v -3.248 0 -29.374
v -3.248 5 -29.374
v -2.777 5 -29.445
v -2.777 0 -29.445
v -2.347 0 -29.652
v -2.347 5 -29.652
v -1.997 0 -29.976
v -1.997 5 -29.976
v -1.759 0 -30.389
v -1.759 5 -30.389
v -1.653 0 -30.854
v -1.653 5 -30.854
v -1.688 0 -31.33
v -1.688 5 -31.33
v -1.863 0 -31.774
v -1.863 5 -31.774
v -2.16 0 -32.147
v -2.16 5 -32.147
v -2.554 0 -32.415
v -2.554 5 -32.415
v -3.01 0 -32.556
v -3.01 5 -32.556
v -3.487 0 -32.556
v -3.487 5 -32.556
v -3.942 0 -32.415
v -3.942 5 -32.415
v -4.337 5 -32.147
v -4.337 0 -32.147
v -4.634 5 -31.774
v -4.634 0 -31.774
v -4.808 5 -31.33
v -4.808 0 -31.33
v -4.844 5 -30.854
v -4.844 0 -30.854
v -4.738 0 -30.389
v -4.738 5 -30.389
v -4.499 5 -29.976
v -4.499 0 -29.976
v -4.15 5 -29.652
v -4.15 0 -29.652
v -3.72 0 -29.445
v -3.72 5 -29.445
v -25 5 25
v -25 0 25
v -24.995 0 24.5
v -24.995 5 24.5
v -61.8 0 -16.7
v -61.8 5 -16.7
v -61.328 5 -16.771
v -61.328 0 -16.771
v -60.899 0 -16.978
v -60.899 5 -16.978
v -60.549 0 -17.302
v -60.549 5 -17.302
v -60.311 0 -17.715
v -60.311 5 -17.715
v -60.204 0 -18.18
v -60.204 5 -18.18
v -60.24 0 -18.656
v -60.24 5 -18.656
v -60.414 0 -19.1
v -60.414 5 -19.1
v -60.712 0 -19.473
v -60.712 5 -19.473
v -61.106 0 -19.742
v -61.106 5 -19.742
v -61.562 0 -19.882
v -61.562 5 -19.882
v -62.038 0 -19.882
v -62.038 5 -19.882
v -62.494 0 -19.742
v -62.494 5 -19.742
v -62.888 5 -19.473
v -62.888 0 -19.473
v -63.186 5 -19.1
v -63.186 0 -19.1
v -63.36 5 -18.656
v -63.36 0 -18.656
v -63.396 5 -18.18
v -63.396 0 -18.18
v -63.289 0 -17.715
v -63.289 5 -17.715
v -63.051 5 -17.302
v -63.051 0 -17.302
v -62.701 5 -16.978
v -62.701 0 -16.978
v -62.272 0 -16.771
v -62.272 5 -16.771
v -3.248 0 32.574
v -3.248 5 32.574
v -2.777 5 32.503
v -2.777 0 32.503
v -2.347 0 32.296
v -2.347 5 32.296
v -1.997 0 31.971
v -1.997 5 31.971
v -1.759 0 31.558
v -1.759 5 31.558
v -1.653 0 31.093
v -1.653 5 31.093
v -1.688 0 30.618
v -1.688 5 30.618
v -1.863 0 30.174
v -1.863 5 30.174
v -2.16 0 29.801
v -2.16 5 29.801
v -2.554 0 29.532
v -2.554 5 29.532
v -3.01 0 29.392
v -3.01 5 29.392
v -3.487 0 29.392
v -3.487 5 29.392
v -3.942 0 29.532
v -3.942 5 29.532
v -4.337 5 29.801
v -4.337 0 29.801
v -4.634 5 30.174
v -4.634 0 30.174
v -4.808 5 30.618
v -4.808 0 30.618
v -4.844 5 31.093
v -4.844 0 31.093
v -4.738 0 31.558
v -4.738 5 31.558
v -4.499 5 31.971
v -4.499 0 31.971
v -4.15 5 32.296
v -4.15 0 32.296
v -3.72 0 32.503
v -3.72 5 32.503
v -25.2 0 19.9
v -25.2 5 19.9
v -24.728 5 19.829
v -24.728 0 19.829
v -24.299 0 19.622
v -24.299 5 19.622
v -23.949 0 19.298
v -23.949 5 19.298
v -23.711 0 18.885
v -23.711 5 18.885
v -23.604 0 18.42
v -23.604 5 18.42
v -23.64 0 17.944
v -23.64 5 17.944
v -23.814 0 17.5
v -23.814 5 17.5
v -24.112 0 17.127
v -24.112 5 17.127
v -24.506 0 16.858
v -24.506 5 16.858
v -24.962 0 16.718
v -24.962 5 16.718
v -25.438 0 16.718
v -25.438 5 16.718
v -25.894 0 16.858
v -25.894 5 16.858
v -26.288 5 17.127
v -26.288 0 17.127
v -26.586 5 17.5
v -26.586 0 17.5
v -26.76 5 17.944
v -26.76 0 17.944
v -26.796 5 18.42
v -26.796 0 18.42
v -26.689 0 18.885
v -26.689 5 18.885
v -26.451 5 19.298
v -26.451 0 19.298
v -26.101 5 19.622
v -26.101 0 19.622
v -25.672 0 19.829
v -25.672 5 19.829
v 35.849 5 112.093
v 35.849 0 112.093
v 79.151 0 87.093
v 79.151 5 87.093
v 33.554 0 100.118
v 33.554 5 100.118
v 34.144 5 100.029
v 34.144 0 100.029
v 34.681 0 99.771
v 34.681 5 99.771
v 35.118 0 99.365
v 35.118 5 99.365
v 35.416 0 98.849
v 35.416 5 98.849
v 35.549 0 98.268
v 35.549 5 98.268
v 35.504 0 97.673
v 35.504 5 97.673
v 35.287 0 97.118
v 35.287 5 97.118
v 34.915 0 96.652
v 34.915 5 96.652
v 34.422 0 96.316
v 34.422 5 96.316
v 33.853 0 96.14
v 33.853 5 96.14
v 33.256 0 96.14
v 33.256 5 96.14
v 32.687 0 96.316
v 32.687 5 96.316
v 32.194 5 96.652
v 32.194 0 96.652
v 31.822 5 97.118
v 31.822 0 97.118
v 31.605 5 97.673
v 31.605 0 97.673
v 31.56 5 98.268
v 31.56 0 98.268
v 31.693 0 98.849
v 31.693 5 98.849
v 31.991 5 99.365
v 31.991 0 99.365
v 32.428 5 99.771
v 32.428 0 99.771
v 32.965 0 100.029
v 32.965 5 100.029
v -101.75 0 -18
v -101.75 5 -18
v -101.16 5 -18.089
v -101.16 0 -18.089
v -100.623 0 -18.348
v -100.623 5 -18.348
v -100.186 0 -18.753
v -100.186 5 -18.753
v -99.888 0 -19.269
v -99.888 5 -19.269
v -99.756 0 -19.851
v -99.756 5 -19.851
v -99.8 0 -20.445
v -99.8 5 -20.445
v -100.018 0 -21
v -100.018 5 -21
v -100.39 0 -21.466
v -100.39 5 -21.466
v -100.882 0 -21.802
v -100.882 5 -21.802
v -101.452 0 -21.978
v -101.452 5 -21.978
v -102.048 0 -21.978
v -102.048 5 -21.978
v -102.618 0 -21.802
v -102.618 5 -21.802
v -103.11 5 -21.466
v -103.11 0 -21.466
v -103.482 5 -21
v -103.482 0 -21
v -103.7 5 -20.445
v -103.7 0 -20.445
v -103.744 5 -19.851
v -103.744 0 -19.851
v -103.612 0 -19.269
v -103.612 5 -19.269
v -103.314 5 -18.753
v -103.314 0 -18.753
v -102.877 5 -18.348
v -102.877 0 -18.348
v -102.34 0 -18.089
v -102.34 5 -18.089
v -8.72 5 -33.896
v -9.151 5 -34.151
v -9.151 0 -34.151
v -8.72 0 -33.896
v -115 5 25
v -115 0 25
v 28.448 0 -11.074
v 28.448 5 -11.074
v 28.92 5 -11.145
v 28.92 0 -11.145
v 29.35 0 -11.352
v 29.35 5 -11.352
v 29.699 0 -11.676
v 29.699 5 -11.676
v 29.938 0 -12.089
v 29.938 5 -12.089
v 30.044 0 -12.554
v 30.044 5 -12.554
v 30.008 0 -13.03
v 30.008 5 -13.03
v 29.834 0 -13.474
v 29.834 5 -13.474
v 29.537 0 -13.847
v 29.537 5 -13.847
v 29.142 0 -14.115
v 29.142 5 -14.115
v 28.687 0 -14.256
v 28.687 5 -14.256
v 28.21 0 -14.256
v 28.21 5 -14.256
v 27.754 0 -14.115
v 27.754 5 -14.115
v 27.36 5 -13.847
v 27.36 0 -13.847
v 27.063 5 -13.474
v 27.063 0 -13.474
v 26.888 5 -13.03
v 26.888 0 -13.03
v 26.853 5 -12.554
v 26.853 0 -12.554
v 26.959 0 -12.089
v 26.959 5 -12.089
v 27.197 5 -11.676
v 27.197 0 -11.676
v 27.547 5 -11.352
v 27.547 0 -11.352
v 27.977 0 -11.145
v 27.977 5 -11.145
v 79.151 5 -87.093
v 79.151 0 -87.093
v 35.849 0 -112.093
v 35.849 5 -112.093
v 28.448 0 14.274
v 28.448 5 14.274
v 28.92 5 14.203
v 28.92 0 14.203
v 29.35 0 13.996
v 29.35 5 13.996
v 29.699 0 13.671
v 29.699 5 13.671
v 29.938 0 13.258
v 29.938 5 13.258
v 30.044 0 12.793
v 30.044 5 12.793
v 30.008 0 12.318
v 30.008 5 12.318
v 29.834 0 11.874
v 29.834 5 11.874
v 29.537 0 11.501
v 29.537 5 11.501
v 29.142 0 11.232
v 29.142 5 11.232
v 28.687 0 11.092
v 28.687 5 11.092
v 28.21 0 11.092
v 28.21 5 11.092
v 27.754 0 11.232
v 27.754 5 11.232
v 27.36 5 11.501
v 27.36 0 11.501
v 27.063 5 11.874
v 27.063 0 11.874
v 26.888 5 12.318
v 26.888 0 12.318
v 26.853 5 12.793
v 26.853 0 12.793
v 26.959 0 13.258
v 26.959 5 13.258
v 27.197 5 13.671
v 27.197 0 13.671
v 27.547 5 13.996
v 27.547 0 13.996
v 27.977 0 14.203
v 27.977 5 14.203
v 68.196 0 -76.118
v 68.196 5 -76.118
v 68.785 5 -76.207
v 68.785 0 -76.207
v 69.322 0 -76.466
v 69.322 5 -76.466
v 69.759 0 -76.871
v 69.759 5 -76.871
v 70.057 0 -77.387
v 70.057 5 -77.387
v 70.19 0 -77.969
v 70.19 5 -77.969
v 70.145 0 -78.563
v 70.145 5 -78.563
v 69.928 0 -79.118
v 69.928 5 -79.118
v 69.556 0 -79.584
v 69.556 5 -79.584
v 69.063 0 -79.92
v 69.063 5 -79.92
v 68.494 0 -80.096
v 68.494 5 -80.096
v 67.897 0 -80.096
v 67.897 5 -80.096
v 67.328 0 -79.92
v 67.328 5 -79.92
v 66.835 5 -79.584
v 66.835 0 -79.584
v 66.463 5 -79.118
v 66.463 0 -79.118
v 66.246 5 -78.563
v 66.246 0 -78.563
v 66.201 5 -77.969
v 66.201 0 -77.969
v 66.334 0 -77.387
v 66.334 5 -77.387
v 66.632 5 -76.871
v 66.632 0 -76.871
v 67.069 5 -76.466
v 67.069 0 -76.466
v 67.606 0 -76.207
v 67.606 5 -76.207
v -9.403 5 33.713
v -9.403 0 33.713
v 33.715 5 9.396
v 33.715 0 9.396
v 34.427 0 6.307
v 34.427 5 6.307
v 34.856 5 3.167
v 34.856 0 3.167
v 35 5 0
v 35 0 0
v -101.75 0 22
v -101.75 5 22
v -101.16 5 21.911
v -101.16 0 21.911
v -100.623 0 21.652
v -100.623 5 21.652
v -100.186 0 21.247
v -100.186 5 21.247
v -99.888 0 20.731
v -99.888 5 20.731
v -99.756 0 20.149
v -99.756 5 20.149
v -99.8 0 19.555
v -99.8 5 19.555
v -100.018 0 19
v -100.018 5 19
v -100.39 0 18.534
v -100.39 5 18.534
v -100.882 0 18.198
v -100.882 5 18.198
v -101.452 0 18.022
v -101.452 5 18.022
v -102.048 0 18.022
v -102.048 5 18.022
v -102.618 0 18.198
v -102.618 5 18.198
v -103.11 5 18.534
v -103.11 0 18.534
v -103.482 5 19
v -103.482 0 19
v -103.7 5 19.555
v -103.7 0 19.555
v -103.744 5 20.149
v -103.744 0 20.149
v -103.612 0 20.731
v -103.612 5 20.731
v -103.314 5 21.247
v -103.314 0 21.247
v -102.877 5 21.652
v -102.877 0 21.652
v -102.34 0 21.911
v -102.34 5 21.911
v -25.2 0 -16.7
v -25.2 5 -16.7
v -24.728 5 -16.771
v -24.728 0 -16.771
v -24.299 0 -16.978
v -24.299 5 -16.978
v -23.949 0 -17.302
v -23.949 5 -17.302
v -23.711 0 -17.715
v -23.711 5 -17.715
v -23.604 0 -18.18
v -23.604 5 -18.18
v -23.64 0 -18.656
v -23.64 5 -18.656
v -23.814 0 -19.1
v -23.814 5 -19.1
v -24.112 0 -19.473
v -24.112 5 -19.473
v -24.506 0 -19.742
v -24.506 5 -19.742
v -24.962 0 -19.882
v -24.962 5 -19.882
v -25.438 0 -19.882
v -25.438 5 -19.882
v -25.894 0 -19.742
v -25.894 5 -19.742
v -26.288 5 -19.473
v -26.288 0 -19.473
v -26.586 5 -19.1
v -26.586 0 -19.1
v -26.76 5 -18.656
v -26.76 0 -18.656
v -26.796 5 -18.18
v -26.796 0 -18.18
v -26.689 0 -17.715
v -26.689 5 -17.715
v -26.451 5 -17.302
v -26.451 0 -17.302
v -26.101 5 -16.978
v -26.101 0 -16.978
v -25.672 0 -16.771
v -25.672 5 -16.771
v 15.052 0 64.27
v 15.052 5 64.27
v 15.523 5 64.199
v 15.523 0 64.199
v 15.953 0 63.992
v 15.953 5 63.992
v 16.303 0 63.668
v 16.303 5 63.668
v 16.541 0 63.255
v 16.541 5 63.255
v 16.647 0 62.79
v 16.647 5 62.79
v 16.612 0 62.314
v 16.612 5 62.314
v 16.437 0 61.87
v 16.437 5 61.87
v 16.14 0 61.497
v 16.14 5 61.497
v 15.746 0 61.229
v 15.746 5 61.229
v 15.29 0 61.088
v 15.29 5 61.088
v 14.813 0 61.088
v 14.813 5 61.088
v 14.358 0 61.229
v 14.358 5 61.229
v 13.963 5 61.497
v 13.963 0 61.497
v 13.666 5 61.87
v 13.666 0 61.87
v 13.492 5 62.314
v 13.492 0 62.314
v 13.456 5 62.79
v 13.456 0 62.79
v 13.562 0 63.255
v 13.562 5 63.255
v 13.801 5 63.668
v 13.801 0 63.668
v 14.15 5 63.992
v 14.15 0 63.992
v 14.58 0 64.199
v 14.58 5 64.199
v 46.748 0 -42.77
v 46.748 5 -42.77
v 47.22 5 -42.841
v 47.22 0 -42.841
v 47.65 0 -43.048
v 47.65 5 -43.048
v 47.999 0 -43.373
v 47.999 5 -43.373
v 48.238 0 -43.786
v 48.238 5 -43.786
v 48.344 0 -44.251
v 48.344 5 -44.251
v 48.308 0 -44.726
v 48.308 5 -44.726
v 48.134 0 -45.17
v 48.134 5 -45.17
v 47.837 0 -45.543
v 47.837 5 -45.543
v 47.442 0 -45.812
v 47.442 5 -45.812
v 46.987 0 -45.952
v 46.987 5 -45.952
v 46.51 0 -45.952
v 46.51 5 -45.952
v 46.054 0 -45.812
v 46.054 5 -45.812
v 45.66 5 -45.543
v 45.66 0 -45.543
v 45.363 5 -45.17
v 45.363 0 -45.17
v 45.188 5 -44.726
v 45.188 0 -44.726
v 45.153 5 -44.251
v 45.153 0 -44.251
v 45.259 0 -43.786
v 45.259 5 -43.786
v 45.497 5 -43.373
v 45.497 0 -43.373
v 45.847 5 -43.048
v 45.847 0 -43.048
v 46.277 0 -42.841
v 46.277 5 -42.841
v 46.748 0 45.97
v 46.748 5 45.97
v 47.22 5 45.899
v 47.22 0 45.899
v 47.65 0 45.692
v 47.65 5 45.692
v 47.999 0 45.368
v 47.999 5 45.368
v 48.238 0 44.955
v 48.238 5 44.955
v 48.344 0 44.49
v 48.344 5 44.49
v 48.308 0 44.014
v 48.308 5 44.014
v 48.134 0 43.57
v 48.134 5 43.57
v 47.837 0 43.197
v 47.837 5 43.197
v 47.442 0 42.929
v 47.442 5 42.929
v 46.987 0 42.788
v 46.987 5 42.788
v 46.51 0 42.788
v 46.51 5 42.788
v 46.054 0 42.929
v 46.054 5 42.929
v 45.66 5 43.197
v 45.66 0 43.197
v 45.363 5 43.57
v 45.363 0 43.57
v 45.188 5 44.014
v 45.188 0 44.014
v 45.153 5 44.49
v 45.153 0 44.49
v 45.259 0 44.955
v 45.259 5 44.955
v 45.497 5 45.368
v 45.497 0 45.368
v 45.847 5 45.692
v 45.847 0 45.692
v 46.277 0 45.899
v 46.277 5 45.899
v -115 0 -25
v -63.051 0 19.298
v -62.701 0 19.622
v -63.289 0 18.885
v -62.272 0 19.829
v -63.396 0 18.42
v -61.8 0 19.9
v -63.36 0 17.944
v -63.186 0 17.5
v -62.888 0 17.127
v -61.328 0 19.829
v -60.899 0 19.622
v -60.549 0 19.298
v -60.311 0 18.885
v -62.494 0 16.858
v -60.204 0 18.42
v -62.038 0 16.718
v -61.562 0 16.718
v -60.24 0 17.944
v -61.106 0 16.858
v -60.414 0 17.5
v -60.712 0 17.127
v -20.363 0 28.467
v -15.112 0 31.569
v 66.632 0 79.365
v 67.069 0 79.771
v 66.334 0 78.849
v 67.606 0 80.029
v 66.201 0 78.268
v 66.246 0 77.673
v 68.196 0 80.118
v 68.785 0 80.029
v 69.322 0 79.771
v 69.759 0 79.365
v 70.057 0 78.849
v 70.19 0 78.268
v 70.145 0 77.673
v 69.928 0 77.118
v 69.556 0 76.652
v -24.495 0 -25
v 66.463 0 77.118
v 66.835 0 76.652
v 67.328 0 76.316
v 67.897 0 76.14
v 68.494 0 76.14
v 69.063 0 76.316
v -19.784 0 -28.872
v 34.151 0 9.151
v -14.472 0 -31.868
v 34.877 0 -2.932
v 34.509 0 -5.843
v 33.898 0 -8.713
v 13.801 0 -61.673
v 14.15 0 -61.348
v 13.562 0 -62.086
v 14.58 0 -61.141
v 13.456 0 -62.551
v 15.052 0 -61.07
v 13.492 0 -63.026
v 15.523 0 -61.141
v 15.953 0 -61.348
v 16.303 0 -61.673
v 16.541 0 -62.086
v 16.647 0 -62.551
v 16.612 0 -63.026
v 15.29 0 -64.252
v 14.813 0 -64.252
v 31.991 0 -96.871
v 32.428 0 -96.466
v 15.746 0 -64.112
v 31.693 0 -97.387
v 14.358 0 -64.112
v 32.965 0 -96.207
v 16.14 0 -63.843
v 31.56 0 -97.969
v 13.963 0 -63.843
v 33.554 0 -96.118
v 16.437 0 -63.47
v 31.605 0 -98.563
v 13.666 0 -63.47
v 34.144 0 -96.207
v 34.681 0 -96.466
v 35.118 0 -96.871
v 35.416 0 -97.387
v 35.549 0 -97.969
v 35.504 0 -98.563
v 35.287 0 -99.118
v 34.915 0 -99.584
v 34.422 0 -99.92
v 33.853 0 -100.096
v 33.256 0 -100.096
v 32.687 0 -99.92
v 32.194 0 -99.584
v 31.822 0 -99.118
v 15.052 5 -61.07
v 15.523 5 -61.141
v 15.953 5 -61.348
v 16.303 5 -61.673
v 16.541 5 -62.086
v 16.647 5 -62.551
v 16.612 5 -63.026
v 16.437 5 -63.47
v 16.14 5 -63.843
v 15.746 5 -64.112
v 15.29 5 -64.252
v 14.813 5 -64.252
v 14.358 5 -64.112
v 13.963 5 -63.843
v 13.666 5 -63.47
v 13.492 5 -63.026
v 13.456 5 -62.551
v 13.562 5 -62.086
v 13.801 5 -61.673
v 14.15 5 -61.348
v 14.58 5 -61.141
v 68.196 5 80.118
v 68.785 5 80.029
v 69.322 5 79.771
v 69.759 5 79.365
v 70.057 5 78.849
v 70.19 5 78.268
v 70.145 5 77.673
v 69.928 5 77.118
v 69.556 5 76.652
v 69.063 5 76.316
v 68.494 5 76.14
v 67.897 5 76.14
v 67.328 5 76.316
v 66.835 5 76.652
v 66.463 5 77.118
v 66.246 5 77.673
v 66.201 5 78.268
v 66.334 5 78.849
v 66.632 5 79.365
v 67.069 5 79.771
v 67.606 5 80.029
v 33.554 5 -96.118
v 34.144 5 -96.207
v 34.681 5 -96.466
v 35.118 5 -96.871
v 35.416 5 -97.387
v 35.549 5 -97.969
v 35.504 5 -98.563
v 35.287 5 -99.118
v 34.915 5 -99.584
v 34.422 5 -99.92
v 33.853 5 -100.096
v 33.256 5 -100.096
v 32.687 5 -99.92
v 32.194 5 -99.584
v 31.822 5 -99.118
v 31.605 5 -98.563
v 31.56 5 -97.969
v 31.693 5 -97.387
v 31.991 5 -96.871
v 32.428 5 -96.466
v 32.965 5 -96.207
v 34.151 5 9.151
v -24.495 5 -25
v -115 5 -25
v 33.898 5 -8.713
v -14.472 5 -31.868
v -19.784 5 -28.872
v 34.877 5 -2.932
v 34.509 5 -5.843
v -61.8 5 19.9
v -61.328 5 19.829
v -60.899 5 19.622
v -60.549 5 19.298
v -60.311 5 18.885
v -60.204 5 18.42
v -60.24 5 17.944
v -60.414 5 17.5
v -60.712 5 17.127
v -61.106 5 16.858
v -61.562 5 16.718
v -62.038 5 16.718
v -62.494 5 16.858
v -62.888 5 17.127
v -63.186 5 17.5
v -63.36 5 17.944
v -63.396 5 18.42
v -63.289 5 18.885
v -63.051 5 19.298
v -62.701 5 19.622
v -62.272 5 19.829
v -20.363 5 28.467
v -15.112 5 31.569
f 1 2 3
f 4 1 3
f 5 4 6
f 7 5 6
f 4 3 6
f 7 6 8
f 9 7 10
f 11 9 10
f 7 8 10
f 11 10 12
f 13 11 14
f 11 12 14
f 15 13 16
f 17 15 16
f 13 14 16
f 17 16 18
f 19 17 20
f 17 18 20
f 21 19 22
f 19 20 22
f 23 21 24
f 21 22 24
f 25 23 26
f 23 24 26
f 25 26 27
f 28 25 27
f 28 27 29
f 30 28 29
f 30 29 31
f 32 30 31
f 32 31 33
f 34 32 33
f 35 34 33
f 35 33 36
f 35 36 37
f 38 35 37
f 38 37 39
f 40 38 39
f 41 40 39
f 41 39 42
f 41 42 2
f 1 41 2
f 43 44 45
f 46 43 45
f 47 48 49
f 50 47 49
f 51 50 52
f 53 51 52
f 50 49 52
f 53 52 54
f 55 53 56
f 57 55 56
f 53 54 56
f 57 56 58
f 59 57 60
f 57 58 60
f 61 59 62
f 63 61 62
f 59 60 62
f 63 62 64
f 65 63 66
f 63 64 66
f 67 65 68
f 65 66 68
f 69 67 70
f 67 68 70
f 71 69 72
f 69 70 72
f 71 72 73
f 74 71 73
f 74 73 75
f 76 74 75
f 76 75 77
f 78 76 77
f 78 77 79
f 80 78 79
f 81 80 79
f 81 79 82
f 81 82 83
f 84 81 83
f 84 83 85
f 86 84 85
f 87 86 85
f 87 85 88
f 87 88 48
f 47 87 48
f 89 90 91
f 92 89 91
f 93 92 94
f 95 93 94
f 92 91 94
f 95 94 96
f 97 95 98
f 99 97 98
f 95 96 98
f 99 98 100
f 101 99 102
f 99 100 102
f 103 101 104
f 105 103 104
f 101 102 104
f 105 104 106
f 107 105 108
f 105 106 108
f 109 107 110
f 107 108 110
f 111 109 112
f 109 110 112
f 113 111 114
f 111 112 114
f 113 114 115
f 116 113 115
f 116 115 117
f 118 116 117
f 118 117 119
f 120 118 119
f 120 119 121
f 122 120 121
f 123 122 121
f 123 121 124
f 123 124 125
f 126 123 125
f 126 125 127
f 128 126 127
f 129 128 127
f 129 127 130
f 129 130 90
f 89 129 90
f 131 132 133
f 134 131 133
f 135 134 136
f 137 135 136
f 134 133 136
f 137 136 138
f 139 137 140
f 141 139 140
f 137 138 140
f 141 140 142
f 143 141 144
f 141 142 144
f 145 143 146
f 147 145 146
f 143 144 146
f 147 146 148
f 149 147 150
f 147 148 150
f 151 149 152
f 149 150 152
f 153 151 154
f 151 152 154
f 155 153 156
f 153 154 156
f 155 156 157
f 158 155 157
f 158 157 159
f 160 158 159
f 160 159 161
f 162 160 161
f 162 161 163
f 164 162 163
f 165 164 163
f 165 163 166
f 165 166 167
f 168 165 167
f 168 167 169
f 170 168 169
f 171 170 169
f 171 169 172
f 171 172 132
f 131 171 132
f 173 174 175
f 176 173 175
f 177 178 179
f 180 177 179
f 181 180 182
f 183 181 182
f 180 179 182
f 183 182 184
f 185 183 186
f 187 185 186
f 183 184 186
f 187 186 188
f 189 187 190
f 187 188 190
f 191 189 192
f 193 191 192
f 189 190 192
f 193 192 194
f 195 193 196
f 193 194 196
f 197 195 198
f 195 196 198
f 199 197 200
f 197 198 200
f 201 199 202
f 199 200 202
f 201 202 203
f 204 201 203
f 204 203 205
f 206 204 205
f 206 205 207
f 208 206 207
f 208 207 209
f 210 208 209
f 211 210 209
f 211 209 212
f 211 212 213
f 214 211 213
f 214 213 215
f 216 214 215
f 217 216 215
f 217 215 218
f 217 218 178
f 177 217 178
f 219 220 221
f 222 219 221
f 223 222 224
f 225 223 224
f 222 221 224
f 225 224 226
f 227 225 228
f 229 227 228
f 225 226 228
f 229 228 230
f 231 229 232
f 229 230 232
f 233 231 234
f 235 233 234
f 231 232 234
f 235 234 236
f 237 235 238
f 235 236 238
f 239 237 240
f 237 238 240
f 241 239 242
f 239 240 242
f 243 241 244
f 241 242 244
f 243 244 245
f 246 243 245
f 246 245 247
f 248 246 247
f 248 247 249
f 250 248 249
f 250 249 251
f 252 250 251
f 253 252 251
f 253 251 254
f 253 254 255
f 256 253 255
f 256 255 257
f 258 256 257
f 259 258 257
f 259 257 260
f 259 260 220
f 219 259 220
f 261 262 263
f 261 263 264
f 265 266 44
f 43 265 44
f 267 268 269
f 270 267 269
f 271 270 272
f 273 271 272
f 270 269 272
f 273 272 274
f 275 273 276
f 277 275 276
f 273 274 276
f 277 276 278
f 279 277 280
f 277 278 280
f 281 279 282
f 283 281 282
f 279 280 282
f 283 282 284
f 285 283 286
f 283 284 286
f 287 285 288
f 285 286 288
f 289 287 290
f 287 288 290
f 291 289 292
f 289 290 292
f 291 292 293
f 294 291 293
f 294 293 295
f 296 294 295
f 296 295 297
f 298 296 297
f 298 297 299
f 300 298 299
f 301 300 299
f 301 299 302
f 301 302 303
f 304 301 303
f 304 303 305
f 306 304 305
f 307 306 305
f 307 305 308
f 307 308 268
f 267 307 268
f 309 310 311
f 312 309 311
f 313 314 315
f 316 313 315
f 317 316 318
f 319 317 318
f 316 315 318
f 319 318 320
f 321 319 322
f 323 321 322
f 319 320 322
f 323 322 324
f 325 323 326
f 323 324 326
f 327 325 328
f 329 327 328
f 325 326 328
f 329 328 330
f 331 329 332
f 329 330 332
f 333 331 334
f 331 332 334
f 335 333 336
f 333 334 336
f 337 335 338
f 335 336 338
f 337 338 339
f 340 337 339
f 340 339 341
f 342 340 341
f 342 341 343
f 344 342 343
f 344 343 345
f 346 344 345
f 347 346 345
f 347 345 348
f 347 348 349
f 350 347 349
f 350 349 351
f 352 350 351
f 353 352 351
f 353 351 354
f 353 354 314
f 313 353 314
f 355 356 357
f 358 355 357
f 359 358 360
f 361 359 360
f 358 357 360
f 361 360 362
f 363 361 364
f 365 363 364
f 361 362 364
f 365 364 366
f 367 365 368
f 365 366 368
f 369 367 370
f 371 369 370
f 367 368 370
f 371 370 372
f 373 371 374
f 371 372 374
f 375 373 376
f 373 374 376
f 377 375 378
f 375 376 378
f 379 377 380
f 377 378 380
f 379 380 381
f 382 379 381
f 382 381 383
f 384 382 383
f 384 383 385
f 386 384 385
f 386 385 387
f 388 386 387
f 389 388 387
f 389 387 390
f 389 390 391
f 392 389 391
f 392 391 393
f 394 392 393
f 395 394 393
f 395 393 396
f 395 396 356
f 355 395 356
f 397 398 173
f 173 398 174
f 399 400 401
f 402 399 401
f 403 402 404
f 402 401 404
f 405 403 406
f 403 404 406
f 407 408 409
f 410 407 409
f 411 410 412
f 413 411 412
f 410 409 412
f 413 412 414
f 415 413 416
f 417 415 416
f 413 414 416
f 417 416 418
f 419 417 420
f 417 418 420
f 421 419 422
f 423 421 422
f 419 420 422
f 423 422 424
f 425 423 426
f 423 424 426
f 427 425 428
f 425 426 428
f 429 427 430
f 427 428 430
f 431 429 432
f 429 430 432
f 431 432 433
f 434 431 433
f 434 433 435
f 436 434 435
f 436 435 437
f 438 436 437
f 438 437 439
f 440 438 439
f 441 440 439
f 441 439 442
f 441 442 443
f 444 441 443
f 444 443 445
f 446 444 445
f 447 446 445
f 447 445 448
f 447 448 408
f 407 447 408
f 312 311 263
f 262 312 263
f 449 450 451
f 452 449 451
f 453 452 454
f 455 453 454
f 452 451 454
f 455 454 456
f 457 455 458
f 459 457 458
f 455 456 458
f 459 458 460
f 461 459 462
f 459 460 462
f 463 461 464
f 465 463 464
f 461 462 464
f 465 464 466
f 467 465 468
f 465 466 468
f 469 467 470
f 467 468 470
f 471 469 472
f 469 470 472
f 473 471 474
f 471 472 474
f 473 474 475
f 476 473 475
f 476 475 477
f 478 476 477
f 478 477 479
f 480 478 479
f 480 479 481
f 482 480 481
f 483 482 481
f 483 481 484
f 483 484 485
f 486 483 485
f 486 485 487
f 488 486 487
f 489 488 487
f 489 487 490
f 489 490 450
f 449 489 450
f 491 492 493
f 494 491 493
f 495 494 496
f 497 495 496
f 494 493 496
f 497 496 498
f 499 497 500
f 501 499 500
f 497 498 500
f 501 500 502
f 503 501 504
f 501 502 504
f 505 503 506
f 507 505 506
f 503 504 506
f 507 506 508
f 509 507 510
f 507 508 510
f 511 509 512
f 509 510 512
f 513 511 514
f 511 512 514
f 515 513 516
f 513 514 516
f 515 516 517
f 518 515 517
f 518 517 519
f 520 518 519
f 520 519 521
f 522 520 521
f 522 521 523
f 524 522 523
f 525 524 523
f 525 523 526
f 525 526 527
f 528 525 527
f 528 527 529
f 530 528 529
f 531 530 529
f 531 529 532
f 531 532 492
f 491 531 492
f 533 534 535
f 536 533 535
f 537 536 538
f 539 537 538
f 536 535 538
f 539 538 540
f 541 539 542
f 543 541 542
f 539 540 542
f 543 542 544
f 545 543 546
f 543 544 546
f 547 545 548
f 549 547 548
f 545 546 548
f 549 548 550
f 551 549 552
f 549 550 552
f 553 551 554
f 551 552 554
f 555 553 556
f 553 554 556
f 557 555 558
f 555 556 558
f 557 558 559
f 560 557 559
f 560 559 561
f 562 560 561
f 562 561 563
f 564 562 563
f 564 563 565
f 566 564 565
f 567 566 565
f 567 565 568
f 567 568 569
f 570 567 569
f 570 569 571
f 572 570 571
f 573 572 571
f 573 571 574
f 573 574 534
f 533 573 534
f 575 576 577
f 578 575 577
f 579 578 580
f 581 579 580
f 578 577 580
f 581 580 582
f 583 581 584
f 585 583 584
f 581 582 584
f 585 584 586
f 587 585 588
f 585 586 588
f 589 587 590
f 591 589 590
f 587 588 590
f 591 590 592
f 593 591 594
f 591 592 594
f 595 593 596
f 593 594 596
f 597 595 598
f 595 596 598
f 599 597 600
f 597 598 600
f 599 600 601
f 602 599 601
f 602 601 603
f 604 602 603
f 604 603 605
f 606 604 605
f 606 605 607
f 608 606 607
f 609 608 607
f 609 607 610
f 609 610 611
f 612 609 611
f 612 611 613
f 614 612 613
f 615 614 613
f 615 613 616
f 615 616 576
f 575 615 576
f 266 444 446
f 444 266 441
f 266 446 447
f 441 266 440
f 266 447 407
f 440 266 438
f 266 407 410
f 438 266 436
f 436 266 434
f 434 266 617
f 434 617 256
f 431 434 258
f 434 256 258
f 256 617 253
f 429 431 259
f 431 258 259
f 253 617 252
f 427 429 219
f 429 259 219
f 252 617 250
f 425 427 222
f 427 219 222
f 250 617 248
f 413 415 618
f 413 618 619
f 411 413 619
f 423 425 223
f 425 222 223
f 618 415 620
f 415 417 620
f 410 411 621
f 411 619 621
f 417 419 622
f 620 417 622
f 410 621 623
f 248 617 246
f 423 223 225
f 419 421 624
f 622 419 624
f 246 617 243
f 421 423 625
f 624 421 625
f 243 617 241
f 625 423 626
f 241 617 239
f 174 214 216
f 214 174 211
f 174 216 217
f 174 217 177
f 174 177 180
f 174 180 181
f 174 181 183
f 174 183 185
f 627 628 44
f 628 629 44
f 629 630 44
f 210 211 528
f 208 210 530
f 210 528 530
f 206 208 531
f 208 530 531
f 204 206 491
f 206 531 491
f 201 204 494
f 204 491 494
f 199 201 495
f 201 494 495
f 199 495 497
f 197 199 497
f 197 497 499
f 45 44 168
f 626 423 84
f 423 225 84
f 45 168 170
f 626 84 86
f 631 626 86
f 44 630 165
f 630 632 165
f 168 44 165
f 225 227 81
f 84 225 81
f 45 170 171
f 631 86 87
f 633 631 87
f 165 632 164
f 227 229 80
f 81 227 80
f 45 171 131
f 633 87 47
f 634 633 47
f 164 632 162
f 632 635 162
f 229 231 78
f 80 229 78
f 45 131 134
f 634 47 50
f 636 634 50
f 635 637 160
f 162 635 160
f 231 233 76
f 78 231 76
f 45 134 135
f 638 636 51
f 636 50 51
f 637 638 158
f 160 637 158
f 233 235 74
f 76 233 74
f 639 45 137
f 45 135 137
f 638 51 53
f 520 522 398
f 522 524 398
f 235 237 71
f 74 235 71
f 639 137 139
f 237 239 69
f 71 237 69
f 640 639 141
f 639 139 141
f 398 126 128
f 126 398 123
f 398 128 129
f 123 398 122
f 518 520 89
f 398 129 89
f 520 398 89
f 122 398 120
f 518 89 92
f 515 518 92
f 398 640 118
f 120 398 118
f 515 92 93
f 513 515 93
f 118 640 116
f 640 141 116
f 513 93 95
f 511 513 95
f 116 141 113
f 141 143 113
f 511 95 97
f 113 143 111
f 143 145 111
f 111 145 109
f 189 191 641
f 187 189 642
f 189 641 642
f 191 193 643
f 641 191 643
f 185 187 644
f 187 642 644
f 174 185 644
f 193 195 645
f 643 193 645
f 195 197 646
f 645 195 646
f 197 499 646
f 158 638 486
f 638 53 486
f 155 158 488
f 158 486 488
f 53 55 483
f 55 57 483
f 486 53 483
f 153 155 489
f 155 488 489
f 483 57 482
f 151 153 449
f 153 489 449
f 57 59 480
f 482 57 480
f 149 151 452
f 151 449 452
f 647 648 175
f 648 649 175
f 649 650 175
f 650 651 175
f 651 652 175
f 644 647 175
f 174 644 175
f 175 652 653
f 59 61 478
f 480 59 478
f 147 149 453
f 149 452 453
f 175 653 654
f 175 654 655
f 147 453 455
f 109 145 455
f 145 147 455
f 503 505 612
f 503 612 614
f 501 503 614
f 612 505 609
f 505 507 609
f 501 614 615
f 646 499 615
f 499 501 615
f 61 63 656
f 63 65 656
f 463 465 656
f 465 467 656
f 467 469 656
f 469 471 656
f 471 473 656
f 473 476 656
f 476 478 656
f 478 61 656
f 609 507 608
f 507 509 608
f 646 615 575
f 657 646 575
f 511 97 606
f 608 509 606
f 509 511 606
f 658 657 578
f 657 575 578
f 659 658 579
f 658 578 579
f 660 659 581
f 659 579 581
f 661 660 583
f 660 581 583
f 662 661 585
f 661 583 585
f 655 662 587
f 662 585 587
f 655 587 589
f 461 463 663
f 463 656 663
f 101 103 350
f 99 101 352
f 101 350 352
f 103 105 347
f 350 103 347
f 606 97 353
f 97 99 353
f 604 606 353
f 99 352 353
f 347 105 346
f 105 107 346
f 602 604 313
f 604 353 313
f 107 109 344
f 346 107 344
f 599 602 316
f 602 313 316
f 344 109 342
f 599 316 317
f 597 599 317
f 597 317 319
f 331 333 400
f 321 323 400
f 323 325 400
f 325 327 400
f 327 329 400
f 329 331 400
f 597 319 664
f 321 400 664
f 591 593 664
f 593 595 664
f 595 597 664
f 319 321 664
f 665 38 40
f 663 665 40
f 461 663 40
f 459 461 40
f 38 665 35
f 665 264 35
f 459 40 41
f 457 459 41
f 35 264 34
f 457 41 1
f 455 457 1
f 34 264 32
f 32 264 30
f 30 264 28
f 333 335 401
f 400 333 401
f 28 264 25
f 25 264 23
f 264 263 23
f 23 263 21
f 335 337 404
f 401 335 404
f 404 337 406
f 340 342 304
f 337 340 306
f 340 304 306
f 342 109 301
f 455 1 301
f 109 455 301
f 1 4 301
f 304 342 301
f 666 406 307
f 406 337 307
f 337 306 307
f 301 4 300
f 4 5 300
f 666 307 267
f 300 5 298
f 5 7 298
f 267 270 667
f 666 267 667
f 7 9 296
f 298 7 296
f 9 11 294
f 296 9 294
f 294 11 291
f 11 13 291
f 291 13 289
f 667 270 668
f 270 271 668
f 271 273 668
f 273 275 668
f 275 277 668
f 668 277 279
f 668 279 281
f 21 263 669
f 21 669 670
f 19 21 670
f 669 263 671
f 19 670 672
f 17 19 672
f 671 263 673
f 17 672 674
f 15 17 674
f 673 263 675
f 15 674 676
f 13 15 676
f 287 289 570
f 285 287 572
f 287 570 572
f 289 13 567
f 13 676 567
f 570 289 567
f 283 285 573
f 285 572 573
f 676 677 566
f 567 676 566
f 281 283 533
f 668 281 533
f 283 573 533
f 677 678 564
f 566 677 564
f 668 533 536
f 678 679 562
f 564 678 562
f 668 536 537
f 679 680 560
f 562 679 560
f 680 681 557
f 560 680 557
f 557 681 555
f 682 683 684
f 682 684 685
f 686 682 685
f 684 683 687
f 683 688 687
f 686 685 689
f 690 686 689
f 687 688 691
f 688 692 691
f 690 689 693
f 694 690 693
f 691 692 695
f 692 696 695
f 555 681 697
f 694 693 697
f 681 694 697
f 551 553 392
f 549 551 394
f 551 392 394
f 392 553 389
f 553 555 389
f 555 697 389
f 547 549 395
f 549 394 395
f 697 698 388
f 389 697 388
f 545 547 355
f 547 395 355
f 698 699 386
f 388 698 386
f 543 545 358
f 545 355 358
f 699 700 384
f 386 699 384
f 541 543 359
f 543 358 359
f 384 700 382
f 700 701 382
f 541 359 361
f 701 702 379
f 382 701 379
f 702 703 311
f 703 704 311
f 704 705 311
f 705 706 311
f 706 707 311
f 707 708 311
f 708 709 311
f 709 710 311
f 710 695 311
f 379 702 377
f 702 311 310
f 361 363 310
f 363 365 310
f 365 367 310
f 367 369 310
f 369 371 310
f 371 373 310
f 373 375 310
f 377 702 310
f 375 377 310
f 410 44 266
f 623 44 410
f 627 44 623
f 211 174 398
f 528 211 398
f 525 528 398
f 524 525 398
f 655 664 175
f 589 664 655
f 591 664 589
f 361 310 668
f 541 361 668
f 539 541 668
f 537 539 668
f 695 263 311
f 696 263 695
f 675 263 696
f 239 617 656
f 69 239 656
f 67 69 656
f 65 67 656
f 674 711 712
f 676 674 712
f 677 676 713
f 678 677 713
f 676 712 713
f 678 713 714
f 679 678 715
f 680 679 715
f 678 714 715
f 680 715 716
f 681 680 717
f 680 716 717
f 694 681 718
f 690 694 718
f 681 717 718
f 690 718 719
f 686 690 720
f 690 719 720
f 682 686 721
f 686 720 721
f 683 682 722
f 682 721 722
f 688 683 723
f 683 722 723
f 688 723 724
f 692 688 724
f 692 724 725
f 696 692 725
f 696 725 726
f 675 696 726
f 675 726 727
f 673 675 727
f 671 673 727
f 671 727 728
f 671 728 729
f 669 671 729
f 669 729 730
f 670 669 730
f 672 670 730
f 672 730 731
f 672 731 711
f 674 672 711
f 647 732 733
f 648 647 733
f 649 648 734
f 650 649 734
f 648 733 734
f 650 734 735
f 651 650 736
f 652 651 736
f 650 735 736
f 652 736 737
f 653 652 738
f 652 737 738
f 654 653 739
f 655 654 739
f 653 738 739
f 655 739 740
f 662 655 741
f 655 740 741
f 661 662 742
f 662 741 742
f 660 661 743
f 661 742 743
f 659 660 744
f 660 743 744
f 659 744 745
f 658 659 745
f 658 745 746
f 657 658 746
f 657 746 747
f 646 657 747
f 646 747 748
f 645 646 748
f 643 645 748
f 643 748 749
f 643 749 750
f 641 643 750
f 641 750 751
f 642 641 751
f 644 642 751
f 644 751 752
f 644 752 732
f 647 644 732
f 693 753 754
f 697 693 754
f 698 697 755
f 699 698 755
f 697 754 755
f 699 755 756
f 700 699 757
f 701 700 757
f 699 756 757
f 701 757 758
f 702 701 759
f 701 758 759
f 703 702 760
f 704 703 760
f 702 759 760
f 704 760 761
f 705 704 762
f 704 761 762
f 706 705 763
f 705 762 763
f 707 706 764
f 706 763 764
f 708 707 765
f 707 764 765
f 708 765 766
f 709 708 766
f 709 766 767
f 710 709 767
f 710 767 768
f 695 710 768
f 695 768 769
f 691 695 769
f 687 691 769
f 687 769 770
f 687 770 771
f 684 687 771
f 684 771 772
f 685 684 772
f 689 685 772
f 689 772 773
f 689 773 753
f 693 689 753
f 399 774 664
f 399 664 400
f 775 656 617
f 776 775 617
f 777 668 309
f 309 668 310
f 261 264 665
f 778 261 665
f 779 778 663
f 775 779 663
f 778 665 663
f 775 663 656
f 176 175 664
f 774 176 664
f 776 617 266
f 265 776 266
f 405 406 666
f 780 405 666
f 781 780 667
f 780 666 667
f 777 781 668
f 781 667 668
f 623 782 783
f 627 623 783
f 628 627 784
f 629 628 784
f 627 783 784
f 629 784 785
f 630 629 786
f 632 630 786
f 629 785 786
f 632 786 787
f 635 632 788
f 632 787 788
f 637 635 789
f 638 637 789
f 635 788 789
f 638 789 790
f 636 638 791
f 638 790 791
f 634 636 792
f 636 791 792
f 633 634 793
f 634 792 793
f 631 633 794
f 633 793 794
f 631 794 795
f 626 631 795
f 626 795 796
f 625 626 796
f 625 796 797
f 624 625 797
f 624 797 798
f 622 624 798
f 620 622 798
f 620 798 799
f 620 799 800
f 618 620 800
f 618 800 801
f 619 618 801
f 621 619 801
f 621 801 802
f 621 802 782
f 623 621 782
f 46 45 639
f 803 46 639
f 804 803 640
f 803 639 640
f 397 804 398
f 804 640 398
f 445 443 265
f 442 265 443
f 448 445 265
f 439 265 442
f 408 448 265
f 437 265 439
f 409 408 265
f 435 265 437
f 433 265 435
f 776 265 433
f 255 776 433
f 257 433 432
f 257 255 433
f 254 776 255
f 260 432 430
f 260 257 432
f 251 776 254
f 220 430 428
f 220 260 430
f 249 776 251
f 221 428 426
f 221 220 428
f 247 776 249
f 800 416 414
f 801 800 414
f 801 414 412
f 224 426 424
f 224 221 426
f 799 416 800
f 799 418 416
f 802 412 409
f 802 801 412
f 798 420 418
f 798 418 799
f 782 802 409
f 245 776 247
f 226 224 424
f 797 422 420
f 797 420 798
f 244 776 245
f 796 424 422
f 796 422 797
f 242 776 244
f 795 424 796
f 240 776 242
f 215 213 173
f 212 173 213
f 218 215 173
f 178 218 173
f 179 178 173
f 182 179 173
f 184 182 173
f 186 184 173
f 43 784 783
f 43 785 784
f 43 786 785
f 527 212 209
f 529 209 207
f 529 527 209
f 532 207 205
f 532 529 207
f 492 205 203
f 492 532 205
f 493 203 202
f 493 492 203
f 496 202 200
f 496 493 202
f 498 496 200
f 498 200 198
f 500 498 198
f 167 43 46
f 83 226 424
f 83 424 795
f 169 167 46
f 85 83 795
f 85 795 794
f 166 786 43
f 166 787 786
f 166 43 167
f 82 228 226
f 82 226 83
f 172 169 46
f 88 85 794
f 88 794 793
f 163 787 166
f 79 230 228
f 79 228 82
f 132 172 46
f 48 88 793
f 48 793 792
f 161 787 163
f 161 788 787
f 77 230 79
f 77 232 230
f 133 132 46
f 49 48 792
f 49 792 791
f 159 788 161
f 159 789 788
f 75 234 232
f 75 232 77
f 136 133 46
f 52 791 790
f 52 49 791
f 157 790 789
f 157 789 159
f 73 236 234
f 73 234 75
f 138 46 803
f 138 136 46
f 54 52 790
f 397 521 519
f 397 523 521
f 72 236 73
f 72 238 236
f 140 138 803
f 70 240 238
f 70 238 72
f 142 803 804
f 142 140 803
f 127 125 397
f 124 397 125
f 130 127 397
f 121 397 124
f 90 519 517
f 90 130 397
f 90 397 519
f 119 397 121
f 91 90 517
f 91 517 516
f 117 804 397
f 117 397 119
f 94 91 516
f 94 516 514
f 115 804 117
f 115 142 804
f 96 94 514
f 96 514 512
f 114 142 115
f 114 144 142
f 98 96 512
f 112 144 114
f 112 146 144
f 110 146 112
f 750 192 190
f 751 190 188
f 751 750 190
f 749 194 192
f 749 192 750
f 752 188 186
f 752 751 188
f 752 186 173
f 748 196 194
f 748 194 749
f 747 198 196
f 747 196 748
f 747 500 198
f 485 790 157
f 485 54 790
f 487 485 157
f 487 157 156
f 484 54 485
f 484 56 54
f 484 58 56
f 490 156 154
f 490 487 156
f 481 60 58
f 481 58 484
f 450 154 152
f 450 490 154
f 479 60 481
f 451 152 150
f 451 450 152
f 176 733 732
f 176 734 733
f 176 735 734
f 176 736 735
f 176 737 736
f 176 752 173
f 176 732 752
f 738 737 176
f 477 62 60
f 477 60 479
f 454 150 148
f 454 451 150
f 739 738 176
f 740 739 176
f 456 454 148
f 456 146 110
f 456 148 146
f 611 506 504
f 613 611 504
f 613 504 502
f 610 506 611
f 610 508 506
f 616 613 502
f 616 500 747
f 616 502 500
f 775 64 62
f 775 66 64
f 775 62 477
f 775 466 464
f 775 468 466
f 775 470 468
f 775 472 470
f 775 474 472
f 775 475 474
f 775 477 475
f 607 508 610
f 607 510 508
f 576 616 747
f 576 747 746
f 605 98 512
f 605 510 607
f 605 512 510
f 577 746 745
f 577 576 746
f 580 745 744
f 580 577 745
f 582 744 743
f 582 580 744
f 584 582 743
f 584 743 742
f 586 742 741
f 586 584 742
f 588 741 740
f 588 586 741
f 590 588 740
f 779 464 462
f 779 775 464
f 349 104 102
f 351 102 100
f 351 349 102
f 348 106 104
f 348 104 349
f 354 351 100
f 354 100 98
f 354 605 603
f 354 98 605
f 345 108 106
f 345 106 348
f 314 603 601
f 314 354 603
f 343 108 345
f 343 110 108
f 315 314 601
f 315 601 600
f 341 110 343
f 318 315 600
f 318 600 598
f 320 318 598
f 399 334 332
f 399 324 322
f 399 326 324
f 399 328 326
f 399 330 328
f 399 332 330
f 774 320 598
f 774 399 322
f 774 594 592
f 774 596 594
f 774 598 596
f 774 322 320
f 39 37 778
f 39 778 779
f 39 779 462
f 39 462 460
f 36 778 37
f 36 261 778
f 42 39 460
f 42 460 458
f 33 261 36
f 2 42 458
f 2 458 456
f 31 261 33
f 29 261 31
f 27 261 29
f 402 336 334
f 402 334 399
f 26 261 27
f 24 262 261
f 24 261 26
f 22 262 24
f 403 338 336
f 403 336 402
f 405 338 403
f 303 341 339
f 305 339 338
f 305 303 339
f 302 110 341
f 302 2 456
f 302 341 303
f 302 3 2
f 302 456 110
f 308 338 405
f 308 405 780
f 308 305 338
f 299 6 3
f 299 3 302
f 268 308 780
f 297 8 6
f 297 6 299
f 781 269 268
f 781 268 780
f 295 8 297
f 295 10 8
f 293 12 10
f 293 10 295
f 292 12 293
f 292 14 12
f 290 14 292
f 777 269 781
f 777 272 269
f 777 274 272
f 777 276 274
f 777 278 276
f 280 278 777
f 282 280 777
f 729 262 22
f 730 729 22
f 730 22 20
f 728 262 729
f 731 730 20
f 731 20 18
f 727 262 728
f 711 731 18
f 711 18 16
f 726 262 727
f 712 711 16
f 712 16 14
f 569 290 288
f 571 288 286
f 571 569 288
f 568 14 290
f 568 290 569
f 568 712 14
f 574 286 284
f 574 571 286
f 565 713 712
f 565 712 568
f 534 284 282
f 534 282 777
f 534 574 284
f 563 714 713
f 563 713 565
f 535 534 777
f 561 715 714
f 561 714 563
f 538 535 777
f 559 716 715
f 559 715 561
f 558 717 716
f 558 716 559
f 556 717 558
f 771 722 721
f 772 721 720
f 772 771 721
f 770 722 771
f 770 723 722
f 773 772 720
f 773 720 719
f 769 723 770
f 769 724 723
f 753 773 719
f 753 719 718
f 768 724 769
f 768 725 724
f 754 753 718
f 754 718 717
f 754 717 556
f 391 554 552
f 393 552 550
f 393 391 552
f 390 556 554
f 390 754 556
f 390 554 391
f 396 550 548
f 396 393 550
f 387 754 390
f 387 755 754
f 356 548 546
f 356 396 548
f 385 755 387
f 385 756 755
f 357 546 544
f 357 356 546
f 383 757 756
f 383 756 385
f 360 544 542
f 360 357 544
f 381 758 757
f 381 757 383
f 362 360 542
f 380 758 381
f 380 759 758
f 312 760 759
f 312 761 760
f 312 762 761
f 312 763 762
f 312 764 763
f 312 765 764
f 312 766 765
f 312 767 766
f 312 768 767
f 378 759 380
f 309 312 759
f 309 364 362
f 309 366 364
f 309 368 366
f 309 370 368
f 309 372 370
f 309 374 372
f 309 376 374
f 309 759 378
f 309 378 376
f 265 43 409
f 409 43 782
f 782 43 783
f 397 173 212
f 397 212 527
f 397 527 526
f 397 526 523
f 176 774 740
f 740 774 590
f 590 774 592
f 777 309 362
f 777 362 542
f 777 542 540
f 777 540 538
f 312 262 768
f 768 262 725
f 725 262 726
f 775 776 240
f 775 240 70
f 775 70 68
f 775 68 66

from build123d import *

# Parameters (mm, degrees)
ESQUISSE3_R             = 35
BOSS_EXTRU_3_DEPTH      = 5
ESQUISSE4_R             = 2
ESQUISSE4_R_2           = 1.6
ENL_V_MAT_EXTRU_1_DEPTH = 161.669919512


with BuildPart() as part:
    # Esquisse3 → Boss.-Extru.3 (new body)
    with BuildSketch(Plane(origin=(0, 0, 0), x_dir=(1, 0, 0), z_dir=(0, 1, 0))):
        with BuildLine():
            Line((-115, -25), (-25, -25))
            Line((-25, -25), (-24.99494949, -24.500051021))
            ThreePointArc((-24.99494949, -24.500051021), (-34.998214236, 0.353553761), (-24.494897428, 25))
            Line((-24.494897428, 25), (-25, 25))
            Line((-25, 25), (-115, 25))
            Line((-115, 25), (-115, -25))
        make_face()
        Circle(ESQUISSE3_R)
        Polygon((-9.403186381, -33.713203436), (35.849364905, -112.092921435), (79.150635095, -87.092921435), (34.150635095, -9.150635095), align=None)
        with BuildLine():
            Line((-24.494897428, 25), (-24.99494949, -24.500051021))
            ThreePointArc((-24.99494949, -24.500051021), (-17.805293657, -30.132565736), (-9.403186381, -33.713203436))
            Line((-9.403186381, -33.713203436), (33.715141323, -9.396235714))
            ThreePointArc((33.715141323, -9.396235714), (34.677297662, -4.741837919), (35, 0))
            ThreePointArc((35, 0), (34.72342821, 4.391302011), (33.898083809, 8.713203436))
            Line((33.898083809, 8.713203436), (-8.720191833, 33.896286735))
            ThreePointArc((-8.720191833, 33.896286735), (-17.19292058, 30.486119496), (-24.494897428, 25))
        make_face()
        Circle(ESQUISSE3_R)
        Polygon((33.898083809, 8.713203436), (79.150635095, 87.092921435), (35.849364905, 112.092921435), (-9.150635095, 34.150635095), align=None)
        with BuildLine():
            ThreePointArc((33.898083809, 8.713203436), (17.805293657, 30.132565736), (-8.720191833, 33.896286735))
            Line((-8.720191833, 33.896286735), (33.898083809, 8.713203436))
        make_face()
    extrude(amount=BOSS_EXTRU_3_DEPTH)

    # Esquisse4 → Enlèv. mat.-Extru.1 (cut, through all)
    with BuildSketch(Plane(origin=(0, 5, 0), x_dir=(1, 0, 0), z_dir=(0, 1, 0))):
        with Locations(Location((-101.75, 20, 0), (0, 0, 270))):
            Circle(ESQUISSE4_R)
        with Locations(Location((-101.75, -20, 0), (0, 0, 270))):
            Circle(ESQUISSE4_R)
        with Locations(Location((33.554491924, -98.118084835, 0), (0, 0, 270))):
            Circle(ESQUISSE4_R)
        with Locations(Location((68.195508076, -78.118084835, 0), (0, 0, 270))):
            Circle(ESQUISSE4_R)
        with Locations(Location((68.195508076, 78.118084835, 0), (0, 0, 270))):
            Circle(ESQUISSE4_R)
        with Locations(Location((33.554491924, 98.118084835, 0), (0, 0, 270))):
            Circle(ESQUISSE4_R)
        with Locations(Location((-3.248264889, -30.973840175, 0), (0, 0, 270))):
            Circle(ESQUISSE4_R_2)
        with Locations(Location((15.051735111, -62.670369954, 0), (0, 0, 270))):
            Circle(ESQUISSE4_R_2)
        with Locations(Location((28.448264889, -12.673840175, 0), (0, 0, 270))):
            Circle(ESQUISSE4_R_2)
        with Locations(Location((46.748264889, -44.370369954, 0), (0, 0, 270))):
            Circle(ESQUISSE4_R_2)
        with Locations(Location((28.448264889, 12.673840175, 0), (0, 0, 270))):
            Circle(ESQUISSE4_R_2)
        with Locations(Location((46.748264889, 44.370369954, 0), (0, 0, 270))):
            Circle(ESQUISSE4_R_2)
        with Locations(Location((15.051735111, 62.670369954, 0), (0, 0, 270))):
            Circle(ESQUISSE4_R_2)
        with Locations(Location((-3.248264889, 30.973840175, 0), (0, 0, 270))):
            Circle(ESQUISSE4_R_2)
        with Locations(Location((-25.2, 18.3, 0), (0, 0, 270))):
            Circle(ESQUISSE4_R_2)
        with Locations(Location((-61.8, -18.3, 0), (0, 0, 270))):
            Circle(ESQUISSE4_R_2)
        with Locations(Location((-25.2, -18.3, 0), (0, 0, 270))):
            Circle(ESQUISSE4_R_2)
        with Locations(Location((-61.8, 18.3, 0), (0, 0, 270))):
            Circle(ESQUISSE4_R_2)
    extrude(amount=-ENL_V_MAT_EXTRU_1_DEPTH, mode=Mode.SUBTRACT)


solid = part.part
